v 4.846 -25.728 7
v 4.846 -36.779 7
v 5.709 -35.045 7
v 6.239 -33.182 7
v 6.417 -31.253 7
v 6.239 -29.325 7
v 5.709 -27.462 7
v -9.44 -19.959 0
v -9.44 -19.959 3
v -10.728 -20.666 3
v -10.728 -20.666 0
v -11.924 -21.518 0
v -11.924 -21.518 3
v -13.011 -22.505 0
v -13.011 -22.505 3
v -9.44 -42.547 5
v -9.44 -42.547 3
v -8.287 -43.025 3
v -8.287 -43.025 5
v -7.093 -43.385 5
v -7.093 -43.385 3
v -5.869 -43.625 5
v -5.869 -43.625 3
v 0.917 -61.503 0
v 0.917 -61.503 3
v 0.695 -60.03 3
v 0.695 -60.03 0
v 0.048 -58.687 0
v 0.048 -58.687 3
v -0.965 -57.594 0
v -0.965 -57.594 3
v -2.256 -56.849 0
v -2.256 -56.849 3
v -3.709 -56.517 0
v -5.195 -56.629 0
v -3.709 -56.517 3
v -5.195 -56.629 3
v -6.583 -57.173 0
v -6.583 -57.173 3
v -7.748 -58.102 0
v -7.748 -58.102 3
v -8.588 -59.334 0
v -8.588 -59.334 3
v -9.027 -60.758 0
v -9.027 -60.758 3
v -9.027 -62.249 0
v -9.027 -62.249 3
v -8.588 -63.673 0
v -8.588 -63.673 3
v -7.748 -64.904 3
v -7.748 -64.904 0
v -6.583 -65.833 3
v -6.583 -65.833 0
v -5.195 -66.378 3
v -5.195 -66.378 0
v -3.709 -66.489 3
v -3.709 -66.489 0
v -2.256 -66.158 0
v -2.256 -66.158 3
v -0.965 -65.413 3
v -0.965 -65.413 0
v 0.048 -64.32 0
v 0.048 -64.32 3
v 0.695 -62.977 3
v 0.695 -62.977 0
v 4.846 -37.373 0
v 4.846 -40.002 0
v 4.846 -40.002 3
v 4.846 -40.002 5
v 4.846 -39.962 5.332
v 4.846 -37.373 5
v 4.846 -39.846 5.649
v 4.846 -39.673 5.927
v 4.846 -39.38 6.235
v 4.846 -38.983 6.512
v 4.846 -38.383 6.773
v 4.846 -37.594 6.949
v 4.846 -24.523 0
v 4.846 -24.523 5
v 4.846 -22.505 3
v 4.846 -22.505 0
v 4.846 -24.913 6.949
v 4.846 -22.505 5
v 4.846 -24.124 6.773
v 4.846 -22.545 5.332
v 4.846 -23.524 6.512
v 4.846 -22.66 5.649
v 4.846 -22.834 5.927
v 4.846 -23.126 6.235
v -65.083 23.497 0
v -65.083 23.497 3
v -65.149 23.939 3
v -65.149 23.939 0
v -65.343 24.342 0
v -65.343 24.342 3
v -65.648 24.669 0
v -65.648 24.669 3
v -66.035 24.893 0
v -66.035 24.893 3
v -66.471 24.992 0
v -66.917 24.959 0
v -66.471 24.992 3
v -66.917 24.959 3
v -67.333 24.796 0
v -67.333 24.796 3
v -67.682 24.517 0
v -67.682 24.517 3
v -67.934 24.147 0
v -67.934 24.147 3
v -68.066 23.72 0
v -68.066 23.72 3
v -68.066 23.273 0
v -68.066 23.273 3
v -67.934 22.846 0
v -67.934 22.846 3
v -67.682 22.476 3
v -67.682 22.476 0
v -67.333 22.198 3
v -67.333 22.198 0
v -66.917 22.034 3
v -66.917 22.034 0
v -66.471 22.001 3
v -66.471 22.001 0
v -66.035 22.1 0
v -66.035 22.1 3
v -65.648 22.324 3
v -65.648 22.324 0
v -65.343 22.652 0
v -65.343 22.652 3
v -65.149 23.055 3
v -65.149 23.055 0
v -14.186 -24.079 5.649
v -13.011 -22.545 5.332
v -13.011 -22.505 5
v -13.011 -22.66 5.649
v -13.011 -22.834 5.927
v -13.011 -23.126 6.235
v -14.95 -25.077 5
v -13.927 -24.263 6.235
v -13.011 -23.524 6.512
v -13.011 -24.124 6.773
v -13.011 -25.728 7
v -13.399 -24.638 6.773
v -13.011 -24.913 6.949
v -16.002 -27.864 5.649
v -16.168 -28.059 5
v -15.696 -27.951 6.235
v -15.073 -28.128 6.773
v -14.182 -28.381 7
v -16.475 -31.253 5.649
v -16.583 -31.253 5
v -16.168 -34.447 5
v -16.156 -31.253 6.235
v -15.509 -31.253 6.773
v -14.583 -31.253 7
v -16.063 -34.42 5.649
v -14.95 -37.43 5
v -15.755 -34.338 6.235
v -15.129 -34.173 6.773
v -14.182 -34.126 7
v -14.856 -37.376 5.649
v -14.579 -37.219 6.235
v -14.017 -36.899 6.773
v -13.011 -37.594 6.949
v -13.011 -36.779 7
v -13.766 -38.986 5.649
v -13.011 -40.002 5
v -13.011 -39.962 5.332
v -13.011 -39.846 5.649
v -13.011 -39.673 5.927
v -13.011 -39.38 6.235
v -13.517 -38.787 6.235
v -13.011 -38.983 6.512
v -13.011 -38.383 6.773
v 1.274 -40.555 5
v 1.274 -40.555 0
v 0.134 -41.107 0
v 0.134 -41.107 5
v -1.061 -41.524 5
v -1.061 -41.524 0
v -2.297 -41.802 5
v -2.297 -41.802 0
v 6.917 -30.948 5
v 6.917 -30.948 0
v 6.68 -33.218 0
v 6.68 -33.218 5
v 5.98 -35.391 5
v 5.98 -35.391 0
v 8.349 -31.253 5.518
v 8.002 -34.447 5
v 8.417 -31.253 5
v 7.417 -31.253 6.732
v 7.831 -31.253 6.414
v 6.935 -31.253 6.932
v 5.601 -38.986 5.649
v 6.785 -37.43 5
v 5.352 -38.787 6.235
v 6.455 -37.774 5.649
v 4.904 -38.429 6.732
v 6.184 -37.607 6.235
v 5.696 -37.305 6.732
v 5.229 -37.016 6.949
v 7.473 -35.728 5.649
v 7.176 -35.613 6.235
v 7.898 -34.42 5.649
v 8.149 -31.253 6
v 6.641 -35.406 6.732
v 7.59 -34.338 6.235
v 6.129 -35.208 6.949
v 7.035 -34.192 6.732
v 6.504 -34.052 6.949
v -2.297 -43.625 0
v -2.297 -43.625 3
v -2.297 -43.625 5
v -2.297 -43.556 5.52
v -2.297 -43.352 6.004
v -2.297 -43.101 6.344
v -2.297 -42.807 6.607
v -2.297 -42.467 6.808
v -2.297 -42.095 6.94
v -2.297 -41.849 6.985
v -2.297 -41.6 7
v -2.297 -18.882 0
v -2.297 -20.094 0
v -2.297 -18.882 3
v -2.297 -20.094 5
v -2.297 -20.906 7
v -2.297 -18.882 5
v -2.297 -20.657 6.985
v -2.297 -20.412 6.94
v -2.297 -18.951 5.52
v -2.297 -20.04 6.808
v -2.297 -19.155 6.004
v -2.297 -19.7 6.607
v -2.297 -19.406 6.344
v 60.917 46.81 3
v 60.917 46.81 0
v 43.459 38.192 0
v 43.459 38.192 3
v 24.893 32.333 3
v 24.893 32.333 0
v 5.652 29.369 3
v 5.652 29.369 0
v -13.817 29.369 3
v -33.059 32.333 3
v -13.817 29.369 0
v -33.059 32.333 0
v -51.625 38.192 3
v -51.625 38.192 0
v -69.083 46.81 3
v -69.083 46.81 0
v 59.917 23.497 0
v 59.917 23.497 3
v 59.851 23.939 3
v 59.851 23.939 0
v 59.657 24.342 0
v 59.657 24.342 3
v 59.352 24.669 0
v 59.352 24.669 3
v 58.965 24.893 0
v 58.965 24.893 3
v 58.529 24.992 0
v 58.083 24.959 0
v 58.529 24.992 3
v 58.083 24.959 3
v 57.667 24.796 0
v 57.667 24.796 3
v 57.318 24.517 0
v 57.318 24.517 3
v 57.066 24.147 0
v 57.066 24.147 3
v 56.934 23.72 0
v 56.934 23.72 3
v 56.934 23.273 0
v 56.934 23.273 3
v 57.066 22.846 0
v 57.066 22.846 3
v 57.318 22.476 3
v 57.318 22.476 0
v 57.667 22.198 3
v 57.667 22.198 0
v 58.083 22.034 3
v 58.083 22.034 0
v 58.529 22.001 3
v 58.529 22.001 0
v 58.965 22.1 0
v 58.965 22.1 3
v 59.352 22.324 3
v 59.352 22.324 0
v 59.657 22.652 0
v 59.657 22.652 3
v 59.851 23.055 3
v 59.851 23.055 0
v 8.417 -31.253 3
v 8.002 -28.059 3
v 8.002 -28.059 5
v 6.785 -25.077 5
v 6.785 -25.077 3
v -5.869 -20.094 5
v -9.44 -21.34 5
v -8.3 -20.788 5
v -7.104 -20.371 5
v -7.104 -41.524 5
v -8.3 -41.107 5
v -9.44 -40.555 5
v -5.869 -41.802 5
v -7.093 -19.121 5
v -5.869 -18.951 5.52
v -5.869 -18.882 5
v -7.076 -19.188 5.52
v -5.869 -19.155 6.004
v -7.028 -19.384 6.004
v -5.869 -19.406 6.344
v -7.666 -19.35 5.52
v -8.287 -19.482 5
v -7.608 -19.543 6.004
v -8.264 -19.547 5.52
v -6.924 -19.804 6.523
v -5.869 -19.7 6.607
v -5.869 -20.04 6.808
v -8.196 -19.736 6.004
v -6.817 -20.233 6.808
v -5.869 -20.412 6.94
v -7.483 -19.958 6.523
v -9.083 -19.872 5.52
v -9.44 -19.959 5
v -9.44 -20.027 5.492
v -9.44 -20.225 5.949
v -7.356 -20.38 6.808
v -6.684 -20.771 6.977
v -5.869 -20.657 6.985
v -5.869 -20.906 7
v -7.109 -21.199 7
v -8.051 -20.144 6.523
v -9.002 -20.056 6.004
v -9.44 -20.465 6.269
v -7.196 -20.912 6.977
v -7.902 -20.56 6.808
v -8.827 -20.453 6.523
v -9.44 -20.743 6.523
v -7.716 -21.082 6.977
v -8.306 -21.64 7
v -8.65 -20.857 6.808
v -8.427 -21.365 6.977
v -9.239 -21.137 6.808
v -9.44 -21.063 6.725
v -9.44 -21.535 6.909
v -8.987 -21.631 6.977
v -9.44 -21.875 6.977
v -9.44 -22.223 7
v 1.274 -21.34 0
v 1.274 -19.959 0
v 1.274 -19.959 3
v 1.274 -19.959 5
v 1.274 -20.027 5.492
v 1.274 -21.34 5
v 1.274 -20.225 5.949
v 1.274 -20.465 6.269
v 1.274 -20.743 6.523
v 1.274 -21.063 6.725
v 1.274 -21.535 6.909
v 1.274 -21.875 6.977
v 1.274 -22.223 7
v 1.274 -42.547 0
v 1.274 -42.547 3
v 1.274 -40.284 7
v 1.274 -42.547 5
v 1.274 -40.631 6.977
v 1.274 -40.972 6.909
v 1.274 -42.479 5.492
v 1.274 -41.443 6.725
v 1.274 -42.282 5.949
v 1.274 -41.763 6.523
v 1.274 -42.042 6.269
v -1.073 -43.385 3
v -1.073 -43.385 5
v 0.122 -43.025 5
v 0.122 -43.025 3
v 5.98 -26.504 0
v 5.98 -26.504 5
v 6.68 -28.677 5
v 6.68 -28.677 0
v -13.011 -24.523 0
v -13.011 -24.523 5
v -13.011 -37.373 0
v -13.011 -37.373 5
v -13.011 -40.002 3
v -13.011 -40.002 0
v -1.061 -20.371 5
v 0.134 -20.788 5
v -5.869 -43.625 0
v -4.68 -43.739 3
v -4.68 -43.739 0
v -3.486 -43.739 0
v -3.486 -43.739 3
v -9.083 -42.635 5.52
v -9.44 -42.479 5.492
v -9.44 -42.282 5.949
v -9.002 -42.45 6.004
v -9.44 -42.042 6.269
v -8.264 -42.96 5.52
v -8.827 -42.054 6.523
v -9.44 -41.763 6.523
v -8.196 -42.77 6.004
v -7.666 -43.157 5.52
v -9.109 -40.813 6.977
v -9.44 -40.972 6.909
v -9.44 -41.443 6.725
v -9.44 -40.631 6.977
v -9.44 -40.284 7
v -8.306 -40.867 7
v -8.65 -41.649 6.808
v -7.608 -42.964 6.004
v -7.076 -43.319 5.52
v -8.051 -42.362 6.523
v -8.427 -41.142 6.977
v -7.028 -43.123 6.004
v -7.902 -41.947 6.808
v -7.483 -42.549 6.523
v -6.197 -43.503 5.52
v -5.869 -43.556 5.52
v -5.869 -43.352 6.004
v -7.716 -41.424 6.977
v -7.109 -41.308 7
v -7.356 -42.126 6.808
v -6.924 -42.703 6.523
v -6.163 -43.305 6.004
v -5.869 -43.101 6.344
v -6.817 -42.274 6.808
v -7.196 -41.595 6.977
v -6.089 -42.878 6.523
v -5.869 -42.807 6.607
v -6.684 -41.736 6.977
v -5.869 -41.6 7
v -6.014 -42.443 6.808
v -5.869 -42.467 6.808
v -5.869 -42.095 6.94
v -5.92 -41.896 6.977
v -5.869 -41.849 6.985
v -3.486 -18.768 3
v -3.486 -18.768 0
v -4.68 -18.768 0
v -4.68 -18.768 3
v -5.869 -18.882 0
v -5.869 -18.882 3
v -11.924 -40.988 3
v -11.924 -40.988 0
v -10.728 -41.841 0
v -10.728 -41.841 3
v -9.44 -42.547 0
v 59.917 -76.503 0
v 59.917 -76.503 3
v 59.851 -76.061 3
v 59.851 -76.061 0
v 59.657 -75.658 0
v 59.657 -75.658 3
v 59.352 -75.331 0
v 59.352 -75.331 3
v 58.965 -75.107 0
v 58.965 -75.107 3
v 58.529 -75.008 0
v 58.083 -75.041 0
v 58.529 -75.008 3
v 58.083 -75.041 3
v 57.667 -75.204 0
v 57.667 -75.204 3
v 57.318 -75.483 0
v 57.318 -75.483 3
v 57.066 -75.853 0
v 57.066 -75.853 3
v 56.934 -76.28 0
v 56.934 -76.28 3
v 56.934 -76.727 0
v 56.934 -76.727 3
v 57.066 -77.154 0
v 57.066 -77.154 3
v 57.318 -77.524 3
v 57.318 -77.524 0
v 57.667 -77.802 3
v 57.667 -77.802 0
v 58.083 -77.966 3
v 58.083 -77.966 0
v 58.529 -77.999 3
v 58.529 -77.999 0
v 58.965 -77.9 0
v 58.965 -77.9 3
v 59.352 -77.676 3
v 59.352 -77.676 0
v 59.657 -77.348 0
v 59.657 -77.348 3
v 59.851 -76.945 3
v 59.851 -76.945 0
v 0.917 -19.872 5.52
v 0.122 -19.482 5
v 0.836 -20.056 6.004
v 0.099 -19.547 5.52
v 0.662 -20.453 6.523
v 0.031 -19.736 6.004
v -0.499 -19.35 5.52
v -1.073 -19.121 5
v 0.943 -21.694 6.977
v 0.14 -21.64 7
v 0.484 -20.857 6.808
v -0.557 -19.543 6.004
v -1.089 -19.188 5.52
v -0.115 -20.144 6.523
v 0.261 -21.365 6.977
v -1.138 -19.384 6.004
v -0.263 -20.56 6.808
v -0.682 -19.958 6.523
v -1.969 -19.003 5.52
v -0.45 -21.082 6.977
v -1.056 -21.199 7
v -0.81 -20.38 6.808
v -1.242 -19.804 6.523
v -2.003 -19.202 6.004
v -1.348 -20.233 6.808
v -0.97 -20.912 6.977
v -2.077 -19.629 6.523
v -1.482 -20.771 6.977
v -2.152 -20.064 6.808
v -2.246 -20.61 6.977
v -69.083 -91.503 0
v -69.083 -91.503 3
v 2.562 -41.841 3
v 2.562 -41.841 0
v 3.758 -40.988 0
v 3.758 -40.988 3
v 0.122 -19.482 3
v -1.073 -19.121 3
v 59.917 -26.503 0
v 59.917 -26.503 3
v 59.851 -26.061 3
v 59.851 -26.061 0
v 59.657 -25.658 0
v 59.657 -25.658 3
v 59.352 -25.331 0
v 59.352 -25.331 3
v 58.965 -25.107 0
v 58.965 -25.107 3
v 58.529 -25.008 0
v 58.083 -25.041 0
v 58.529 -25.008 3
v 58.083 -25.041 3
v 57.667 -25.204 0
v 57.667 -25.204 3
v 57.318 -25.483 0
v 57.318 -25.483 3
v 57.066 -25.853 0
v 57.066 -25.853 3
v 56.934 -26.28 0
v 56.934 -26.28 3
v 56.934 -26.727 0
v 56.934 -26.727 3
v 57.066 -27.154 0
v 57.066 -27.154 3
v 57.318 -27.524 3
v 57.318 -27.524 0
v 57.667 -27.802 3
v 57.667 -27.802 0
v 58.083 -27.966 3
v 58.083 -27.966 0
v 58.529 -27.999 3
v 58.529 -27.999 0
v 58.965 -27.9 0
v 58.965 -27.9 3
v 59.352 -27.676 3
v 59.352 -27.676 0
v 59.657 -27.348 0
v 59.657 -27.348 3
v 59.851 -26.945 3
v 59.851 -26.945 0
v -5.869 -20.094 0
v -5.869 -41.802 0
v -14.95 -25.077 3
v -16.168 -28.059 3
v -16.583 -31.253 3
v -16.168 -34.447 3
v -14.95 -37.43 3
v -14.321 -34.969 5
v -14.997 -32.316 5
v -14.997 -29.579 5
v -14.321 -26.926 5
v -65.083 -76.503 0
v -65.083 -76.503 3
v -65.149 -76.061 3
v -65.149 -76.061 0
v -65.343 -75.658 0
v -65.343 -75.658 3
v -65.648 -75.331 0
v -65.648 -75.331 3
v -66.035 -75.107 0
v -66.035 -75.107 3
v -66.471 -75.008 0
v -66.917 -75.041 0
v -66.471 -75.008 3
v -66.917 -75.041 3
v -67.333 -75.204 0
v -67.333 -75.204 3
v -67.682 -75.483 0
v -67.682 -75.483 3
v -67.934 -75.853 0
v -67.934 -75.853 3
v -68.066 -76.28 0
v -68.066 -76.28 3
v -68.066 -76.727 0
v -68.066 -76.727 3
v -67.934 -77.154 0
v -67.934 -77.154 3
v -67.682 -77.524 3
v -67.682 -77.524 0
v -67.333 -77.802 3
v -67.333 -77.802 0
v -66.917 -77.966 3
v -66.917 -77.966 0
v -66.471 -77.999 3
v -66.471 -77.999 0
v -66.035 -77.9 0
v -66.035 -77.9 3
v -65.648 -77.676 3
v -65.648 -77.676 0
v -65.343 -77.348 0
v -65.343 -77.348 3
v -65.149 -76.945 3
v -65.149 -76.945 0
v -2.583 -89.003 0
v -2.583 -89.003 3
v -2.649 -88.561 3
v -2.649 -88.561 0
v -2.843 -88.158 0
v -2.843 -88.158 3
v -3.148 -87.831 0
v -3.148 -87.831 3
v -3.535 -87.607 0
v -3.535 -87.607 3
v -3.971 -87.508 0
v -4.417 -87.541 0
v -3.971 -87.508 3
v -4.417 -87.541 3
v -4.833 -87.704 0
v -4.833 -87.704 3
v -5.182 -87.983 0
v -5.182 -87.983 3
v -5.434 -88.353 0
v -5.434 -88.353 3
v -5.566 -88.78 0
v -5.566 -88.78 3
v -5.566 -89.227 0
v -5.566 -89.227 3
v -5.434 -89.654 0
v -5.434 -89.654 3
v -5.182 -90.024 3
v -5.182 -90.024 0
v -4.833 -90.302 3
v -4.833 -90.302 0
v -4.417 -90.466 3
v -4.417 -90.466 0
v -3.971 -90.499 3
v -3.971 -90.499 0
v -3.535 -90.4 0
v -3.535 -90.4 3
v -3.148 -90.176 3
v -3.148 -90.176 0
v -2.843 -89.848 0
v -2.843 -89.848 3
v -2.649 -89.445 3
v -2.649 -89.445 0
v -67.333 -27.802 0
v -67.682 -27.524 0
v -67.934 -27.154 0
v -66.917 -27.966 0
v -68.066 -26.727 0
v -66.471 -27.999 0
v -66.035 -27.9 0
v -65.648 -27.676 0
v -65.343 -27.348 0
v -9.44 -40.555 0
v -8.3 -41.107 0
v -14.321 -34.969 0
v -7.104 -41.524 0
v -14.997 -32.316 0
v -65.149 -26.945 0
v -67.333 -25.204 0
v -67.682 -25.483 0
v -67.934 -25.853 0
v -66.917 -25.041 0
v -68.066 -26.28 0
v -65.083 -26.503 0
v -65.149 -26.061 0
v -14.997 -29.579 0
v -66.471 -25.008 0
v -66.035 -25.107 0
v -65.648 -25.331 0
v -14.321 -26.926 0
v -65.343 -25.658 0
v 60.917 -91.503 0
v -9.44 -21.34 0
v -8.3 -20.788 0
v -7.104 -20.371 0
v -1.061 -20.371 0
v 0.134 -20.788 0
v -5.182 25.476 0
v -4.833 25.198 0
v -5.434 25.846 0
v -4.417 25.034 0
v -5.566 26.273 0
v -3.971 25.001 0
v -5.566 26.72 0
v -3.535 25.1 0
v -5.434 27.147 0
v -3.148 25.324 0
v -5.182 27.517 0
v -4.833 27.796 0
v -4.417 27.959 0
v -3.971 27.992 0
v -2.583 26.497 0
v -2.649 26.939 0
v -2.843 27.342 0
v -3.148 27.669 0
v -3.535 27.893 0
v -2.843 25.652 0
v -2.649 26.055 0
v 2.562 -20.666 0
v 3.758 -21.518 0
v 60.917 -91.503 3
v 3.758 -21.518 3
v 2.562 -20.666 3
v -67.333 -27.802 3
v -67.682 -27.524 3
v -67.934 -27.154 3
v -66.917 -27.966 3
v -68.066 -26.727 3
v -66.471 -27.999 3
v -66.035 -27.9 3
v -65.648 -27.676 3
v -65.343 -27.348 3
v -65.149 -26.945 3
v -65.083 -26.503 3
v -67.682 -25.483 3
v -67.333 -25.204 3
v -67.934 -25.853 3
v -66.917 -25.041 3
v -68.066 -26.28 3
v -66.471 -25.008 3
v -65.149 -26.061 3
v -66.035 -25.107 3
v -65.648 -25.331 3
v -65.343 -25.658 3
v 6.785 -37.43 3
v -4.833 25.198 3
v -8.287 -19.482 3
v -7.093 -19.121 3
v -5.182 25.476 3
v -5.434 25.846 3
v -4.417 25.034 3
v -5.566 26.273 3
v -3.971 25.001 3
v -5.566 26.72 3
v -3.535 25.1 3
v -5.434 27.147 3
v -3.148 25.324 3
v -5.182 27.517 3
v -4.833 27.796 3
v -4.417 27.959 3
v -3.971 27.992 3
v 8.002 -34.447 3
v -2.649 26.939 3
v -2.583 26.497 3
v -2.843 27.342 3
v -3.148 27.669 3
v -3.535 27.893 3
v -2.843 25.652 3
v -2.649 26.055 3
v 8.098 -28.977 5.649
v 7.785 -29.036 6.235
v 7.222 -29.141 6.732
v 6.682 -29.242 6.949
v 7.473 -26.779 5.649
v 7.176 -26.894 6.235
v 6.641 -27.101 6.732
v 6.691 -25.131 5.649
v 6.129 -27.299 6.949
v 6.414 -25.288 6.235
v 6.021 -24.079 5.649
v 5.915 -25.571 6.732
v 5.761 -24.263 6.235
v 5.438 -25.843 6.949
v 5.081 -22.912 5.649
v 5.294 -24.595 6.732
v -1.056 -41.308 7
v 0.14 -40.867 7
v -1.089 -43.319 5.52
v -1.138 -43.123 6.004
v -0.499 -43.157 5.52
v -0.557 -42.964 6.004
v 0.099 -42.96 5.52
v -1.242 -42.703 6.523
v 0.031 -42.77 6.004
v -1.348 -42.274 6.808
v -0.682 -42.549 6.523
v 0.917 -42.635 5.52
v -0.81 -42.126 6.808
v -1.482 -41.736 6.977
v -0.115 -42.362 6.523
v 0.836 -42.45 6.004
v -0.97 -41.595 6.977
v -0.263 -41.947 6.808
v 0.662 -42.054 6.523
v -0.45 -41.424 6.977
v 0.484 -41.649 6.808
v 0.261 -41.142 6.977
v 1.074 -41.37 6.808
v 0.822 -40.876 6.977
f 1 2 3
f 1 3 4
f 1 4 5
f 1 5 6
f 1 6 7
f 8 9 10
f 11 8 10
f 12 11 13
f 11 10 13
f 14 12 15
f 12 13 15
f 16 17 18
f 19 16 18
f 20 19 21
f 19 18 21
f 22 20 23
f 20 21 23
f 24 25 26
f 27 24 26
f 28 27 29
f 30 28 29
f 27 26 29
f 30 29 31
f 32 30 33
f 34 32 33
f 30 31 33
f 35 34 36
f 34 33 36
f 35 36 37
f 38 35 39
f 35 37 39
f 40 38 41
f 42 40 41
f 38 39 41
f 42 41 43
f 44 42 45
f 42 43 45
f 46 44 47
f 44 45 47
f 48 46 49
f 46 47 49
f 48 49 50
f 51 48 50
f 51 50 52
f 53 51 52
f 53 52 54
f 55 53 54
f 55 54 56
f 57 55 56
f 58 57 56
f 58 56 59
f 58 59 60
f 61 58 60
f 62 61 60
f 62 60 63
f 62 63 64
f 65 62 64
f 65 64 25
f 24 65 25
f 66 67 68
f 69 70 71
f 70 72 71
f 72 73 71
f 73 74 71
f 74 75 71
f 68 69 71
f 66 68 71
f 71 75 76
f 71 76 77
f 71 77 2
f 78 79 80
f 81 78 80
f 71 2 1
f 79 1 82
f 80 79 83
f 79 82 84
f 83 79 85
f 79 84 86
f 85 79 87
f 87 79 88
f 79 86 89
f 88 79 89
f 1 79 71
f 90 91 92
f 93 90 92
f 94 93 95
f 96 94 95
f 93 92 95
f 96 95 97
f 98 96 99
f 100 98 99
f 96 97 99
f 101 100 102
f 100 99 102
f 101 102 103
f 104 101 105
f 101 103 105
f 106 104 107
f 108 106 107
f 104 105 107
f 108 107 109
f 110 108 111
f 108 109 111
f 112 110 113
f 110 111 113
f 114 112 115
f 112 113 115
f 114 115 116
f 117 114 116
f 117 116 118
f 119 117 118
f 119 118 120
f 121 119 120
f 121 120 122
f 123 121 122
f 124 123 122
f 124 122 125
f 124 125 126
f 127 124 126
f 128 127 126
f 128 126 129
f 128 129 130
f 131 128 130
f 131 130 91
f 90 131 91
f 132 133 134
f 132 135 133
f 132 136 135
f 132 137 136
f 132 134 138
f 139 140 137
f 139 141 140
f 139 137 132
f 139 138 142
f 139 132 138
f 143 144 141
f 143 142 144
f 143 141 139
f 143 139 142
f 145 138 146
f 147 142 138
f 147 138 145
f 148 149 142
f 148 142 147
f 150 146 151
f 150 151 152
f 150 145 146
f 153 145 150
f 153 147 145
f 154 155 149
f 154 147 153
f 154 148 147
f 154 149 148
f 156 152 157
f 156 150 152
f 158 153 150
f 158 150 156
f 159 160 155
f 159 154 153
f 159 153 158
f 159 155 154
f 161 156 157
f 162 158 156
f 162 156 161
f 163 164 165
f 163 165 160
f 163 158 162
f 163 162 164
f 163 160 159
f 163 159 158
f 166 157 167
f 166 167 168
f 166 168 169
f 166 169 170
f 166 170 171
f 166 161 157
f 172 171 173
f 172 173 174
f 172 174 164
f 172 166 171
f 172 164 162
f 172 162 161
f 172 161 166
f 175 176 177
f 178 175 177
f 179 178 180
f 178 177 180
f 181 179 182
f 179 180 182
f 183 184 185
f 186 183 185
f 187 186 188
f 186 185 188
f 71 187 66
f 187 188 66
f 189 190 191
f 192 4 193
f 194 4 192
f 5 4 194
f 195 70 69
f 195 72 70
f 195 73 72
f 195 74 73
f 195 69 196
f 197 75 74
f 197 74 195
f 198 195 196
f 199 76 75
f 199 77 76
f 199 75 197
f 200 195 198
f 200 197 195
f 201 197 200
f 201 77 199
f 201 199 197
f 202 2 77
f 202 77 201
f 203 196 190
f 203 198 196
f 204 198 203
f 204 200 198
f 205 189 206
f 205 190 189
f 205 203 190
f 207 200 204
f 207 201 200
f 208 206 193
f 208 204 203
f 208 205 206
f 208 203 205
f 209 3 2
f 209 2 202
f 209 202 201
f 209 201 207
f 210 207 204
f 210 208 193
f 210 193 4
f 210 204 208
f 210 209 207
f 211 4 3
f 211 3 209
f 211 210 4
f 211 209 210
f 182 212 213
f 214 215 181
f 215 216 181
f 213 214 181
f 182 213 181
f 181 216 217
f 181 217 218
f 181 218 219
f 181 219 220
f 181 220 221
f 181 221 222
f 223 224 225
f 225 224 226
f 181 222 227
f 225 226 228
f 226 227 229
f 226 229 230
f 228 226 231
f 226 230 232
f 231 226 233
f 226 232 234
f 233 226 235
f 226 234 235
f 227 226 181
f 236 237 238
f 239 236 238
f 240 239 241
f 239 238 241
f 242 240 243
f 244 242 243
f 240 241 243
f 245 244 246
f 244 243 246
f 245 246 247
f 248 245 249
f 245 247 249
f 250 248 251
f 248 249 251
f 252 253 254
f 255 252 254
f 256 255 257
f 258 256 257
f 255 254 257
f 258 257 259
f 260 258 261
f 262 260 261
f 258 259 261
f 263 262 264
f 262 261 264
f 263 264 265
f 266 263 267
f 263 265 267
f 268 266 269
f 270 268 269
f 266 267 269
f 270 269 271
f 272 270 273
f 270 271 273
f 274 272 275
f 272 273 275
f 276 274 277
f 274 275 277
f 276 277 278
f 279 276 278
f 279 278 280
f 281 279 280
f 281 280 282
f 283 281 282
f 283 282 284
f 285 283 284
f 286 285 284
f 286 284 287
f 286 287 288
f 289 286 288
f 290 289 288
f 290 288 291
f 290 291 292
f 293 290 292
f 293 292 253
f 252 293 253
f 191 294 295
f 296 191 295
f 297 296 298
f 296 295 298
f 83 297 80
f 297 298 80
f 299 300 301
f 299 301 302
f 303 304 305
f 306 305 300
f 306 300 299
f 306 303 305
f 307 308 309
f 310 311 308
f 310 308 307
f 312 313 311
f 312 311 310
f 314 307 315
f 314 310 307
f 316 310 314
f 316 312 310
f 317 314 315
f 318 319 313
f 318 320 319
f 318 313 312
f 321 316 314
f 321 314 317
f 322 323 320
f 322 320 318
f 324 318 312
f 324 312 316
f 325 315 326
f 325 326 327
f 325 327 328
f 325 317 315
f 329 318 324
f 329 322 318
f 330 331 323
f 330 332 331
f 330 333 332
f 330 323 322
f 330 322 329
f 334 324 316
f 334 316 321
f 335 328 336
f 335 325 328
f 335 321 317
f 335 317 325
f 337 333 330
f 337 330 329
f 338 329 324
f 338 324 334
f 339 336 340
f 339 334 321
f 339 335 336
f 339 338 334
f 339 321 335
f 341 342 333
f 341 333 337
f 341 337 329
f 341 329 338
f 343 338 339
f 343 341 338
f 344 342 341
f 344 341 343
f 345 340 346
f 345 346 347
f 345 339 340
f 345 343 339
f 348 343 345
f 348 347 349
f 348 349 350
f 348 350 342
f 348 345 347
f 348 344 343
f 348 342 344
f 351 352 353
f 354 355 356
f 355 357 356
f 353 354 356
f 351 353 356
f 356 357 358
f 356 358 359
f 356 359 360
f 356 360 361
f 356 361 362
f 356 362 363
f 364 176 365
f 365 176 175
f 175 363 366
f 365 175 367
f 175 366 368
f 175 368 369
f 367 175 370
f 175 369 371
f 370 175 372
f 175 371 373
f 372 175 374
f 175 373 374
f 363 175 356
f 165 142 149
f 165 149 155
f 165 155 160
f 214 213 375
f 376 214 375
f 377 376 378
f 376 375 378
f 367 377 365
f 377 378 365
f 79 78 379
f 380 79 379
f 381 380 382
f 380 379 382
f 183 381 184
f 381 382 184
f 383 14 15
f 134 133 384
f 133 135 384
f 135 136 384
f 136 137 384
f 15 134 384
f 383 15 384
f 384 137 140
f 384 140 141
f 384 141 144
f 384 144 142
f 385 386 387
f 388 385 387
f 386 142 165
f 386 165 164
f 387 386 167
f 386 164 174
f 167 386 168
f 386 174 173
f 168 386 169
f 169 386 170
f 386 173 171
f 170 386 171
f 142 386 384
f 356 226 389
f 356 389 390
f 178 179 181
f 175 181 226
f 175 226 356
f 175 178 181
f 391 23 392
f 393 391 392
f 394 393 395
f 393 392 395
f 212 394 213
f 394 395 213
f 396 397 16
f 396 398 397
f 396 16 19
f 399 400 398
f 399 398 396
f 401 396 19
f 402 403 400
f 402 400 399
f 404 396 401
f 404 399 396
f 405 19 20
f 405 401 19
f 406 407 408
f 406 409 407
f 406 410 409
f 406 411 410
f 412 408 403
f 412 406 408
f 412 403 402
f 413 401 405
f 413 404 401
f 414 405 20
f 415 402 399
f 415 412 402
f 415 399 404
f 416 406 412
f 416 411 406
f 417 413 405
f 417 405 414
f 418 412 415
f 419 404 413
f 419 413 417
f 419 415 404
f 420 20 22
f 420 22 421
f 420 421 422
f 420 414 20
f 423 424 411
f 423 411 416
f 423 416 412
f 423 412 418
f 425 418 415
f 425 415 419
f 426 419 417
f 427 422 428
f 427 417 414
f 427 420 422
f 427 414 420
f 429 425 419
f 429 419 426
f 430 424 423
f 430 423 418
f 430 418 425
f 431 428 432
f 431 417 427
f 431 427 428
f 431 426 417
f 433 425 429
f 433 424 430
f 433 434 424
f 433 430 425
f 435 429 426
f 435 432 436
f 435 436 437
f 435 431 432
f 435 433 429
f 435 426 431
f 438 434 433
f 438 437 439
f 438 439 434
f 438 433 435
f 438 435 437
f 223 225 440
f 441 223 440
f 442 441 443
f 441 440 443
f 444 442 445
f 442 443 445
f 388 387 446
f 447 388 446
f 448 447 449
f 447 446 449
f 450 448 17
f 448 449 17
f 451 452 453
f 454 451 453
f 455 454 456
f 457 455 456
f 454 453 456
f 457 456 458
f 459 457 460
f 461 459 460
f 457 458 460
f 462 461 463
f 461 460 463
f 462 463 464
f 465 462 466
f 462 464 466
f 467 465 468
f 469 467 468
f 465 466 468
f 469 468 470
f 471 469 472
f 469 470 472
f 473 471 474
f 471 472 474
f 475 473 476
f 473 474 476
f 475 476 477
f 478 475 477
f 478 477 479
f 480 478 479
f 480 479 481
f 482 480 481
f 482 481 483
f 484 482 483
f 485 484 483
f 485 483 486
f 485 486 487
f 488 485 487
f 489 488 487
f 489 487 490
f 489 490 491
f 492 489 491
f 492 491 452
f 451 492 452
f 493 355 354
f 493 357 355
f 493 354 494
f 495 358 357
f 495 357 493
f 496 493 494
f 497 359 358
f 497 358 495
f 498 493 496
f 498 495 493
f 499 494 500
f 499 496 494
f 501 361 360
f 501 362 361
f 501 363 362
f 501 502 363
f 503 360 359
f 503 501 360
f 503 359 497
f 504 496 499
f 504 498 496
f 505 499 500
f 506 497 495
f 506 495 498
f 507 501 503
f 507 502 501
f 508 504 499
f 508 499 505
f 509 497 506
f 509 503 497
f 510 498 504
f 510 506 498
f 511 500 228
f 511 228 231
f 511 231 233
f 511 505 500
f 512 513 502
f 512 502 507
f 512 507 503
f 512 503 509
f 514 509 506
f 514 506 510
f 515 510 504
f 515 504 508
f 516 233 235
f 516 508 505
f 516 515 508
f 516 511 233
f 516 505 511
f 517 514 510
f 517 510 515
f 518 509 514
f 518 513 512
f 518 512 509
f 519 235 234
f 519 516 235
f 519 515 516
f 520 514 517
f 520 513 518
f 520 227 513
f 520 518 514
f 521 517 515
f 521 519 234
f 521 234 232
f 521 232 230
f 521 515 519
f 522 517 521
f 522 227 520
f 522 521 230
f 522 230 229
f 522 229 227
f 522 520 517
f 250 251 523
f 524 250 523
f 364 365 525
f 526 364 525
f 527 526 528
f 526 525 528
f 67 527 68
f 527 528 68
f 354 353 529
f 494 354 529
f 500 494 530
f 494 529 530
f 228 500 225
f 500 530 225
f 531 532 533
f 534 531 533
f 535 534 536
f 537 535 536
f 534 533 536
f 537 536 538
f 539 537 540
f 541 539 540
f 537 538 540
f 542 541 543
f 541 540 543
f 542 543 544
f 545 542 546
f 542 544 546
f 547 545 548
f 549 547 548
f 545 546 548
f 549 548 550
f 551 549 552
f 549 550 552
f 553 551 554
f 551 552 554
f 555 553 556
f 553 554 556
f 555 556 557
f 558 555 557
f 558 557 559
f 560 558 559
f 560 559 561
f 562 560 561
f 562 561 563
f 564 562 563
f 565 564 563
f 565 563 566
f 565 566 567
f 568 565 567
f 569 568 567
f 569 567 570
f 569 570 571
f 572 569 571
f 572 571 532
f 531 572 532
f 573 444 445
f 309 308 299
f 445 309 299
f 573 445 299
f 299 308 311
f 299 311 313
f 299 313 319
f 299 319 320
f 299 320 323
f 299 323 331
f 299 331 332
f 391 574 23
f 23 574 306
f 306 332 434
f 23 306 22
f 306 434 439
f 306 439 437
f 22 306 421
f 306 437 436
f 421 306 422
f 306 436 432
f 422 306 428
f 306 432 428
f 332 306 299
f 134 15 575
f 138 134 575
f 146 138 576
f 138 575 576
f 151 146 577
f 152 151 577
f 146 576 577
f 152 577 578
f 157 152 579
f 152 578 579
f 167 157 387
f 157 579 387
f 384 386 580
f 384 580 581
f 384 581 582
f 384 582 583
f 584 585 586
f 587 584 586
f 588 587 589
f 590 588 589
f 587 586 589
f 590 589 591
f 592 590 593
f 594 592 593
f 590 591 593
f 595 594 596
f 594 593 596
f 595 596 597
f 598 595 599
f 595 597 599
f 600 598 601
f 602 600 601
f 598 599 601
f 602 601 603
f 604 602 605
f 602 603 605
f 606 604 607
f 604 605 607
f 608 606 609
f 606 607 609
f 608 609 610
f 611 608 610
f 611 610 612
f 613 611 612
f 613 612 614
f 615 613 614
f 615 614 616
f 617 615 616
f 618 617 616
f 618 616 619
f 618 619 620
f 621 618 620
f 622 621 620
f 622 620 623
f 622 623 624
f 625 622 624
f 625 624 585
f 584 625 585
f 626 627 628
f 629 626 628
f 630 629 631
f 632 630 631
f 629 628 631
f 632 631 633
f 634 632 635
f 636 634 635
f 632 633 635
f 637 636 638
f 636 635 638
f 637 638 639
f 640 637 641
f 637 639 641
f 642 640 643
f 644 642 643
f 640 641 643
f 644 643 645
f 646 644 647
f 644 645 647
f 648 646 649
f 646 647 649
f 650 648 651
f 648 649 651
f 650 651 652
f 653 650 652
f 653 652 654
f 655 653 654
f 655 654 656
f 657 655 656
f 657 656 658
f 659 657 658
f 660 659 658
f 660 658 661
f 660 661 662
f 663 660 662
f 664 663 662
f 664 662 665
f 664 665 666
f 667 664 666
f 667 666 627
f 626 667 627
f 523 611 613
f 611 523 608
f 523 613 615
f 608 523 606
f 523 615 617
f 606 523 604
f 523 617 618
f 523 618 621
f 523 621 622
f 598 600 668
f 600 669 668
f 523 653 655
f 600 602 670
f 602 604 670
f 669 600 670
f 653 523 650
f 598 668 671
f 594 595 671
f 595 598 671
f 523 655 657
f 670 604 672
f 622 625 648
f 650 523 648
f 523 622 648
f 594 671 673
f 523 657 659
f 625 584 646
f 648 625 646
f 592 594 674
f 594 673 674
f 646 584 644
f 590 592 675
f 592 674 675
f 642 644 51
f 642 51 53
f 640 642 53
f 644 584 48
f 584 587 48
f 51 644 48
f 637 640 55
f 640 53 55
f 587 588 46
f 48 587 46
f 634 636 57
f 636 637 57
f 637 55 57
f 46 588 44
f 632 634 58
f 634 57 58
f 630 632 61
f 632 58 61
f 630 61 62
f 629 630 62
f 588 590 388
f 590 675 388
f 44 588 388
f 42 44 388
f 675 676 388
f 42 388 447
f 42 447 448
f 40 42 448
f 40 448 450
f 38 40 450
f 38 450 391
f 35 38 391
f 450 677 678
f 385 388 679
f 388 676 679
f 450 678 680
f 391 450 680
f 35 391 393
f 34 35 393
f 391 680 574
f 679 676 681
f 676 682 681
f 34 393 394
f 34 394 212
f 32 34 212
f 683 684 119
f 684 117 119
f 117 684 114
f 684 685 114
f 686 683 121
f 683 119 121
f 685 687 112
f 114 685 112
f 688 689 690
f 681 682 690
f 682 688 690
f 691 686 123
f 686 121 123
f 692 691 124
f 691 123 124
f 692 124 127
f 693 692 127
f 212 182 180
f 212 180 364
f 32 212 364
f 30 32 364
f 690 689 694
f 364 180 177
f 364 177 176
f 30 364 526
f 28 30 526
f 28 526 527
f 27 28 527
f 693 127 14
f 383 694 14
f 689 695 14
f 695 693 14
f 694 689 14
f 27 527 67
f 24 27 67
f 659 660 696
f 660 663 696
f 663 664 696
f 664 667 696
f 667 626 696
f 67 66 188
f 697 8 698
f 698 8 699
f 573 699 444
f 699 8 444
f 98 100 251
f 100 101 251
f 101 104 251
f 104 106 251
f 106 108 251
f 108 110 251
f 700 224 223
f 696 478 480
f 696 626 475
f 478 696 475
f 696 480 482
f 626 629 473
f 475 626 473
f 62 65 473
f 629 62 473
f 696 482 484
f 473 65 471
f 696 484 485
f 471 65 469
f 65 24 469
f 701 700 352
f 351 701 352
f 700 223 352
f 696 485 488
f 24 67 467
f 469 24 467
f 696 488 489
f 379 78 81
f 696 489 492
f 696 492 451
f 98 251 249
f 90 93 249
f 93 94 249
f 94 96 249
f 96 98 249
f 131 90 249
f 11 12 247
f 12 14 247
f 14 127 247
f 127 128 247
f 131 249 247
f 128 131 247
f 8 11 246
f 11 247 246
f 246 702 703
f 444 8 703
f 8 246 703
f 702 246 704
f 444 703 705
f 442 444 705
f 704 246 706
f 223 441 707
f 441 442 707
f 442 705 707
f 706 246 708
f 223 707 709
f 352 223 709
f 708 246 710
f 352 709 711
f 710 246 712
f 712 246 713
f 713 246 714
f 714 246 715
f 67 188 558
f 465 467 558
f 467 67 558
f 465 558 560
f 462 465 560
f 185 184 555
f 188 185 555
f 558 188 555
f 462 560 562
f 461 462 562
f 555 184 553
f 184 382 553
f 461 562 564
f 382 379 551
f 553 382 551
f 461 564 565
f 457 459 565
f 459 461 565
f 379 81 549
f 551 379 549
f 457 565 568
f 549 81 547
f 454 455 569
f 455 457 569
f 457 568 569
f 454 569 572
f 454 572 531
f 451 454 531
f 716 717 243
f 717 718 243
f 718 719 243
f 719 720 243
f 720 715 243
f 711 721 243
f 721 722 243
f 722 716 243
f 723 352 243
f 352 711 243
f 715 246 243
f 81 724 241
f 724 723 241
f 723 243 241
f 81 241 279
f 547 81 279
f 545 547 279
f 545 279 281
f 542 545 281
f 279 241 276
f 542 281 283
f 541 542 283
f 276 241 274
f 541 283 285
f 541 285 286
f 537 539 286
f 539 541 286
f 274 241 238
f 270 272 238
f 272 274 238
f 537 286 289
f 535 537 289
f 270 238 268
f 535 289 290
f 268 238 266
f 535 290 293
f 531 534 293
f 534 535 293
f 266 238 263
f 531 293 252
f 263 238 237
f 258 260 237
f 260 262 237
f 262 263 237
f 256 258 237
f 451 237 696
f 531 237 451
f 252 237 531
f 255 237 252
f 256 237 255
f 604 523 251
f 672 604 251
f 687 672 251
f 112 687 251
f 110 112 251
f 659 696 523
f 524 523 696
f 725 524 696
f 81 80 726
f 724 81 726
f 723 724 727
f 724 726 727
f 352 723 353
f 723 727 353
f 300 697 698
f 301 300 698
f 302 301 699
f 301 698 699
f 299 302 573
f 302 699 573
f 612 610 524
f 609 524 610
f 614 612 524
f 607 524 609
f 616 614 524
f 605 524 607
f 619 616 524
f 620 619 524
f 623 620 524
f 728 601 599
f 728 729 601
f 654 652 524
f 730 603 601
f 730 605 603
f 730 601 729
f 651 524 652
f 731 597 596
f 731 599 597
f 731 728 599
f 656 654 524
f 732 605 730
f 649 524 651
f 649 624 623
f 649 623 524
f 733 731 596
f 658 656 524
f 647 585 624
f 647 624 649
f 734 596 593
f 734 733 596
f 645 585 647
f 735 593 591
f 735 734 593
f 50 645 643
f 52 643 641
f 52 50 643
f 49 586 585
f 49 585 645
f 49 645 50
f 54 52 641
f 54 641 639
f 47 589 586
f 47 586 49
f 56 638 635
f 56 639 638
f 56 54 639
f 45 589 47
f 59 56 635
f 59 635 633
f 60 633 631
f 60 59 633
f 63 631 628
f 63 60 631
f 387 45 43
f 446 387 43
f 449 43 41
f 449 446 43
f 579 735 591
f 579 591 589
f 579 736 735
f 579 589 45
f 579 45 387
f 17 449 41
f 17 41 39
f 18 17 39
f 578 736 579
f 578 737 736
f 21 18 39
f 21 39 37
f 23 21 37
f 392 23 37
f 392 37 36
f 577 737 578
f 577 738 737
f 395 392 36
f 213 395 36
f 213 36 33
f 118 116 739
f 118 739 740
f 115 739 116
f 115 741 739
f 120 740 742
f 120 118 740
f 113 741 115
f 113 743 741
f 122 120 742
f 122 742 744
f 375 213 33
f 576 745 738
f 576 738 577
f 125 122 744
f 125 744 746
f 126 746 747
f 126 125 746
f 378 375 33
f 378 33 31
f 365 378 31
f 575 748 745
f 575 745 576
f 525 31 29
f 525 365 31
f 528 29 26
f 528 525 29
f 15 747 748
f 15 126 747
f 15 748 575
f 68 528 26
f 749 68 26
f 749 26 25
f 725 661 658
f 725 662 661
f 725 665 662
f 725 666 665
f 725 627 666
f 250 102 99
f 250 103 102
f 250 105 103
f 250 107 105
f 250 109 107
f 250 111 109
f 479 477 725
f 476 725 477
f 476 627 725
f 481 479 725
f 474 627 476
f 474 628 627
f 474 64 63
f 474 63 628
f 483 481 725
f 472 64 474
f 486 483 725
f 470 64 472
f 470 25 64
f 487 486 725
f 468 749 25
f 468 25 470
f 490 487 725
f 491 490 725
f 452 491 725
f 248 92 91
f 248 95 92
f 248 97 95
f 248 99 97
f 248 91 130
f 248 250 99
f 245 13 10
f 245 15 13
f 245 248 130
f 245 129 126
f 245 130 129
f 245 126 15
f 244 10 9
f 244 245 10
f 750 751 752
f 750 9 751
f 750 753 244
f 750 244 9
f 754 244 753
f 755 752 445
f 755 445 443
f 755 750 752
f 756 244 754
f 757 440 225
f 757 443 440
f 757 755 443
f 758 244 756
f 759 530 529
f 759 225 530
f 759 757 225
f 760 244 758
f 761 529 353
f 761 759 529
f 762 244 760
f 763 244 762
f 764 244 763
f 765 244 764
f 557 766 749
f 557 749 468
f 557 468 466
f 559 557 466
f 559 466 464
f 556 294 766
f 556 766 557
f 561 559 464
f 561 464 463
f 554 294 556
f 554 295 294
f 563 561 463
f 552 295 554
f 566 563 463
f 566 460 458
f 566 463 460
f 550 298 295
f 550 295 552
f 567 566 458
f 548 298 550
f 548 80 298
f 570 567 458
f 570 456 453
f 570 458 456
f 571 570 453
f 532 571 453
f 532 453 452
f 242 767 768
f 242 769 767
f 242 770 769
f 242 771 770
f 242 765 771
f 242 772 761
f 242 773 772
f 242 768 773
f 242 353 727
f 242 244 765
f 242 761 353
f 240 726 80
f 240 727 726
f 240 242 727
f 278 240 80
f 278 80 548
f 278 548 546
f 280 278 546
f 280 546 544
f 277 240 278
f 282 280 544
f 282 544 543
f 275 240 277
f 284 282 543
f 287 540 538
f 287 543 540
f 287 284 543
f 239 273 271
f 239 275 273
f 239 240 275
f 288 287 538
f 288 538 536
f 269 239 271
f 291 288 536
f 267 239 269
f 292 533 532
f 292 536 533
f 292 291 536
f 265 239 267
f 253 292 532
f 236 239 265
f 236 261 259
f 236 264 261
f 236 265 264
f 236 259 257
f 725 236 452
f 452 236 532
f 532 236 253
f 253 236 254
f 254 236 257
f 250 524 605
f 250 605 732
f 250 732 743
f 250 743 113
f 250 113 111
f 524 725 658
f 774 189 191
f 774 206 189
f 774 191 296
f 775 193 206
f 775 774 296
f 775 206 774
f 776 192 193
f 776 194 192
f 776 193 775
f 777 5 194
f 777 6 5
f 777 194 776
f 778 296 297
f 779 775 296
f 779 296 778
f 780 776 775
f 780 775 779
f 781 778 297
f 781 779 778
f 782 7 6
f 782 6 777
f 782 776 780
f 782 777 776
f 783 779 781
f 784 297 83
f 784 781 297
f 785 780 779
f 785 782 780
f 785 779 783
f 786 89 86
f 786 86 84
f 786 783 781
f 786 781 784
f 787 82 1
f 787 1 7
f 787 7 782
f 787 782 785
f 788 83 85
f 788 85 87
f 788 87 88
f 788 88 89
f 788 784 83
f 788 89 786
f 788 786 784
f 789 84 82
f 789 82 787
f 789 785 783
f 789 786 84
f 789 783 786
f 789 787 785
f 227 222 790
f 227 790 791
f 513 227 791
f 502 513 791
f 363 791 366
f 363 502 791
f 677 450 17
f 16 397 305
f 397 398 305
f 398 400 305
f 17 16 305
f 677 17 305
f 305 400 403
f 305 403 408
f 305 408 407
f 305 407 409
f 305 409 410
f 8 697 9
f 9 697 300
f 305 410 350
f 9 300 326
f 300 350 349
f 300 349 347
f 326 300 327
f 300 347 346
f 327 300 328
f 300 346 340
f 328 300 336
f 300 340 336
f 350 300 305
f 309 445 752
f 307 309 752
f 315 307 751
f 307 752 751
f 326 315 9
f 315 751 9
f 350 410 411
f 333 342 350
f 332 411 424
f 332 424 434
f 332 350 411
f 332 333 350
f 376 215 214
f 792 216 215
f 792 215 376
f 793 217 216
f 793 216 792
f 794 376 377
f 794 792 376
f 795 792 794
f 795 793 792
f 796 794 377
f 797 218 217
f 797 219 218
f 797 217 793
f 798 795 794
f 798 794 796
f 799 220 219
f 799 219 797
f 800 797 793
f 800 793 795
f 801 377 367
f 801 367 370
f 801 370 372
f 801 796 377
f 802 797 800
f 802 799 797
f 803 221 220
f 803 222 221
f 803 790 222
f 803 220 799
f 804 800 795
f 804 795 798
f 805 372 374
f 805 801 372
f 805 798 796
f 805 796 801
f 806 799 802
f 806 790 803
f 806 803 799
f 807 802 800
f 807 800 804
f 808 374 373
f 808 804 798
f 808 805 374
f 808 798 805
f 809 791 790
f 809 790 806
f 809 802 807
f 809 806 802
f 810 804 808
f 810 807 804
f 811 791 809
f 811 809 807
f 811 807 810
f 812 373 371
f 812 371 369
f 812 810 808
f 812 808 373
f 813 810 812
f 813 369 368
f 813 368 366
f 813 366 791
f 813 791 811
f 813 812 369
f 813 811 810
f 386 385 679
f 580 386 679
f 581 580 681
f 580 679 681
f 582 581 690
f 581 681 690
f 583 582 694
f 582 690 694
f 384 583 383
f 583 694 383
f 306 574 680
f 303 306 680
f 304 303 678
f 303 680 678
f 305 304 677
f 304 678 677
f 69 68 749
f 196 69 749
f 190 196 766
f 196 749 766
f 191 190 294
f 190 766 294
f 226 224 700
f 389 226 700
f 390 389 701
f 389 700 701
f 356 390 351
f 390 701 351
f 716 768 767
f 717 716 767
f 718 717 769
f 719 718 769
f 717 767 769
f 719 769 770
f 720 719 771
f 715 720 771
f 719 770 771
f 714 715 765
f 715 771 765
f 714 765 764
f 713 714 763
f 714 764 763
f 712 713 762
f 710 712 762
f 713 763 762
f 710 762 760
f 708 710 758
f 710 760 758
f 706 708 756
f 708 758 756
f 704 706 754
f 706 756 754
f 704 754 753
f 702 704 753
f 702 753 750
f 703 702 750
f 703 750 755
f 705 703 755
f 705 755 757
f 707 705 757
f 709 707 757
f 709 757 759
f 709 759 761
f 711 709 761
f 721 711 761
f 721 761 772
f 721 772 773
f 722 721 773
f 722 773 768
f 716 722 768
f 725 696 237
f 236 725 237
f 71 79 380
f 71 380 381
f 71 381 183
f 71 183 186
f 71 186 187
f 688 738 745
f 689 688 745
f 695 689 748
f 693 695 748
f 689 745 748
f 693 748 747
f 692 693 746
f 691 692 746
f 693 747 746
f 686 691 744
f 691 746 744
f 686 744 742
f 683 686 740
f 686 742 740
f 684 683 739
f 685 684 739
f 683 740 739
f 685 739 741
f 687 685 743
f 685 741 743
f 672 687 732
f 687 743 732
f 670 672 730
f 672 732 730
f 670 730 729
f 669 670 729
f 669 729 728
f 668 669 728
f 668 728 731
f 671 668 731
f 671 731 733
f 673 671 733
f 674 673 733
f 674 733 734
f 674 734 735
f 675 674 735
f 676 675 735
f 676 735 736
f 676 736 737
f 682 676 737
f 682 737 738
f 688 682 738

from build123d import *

# Parameters (mm, degrees)
F1_DEPTH  = 3
F2_R      = 1.5
F3_DEPTH  = 25
F5_DEPTH  = 4
F6_DEPTH  = 25
F7_R      = 2
F9_DEPTH  = 5
F10_R     = 5
F11_DEPTH = 25


# Not quite as in the source:
# - ends of sketch curves that miss each other by under 0.0002 mm in the source are joined


with BuildPart() as f1:
    # F0 (on Top) → F1 (new body)
    with BuildSketch(Plane.XY):
        with BuildLine():
            ThreePointArc((49.2280806434, 33.0130470502), (48.1713658013, 32.5621821126), (47.1108383201, 32.1203598507))
            Line((47.1108383201, 32.1203598507), (-4.1065374511, -22.3721440377))
            Line((-4.1065374511, -22.3721440377), (54.4172076095, -84.5927516487))
            Line((54.4172076095, -84.5927516487), (54.4172076095, 33.0130470502))
            Line((54.4172076095, 33.0130470502), (49.2280806434, 33.0130470502))
        make_face()
        Polygon((-4.1065374511, -22.3721440377), (-62.5827923905, -84.587700803), (-62.5827923905, -85.003347494), (54.4172076095, -85.003347494), (54.4172076095, -84.5927516487), align=None)
        with BuildLine():
            Line((-62.5827923905, 33.0130470502), (-62.5827923905, -84.587700803))
            Line((-62.5827923905, -84.587700803), (-4.1065374511, -22.3721440377))
            Line((-4.1065374511, -22.3721440377), (-55.4151337668, 32.1775440438))
            ThreePointArc((-55.4151337668, 32.1775440438), (-56.406067296, 32.5913463114), (-57.3936654243, 33.0130470502))
            Line((-57.3936654243, 33.0130470502), (-62.5827923905, 33.0130470502))
        make_face()
        with BuildLine():
            Line((-4.1065374511, -22.3721440377), (47.1108383201, 32.1203598507))
            ThreePointArc((47.1108383201, 32.1203598507), (-4.1578101896, 21.9966734267), (-55.4151337668, 32.1775440438))
            Line((-55.4151337668, 32.1775440438), (-4.1065374511, -22.3721440377))
        make_face()
        with BuildLine():
            ThreePointArc((60.9172316623, 46.8096119171), (-4.082778411, 28.996652506), (-69.0827923905, 46.8095976636))
            Line((-69.0827923905, 46.8095976636), (-69.0827923905, -91.503347494))
            Line((-69.0827923905, -91.503347494), (-62.5827923905, -84.587700803))
            Line((-62.5827923905, -84.587700803), (-62.5827923905, 33.0130470502))
            Line((-62.5827923905, 33.0130470502), (-57.3936654243, 33.0130470502))
            ThreePointArc((-57.3936654243, 33.0130470502), (-56.406067296, 32.5913463114), (-55.4151337668, 32.1775440438))
            ThreePointArc((-55.4151337668, 32.1775440438), (-4.1578101896, 21.9966734267), (47.1108383201, 32.1203598507))
            Line((47.1108383201, 32.1203598507), (60.9172316623, 46.8096119171))
        make_face()
        with BuildLine():
            Line((60.9172076095, -91.503347494), (60.9172076095, 46.809652506))
            Line((60.9172076095, 46.809652506), (47.1108383201, 32.1203598507))
            ThreePointArc((47.1108383201, 32.1203598507), (48.1713658013, 32.5621821126), (49.2280806434, 33.0130470502))
            Line((49.2280806434, 33.0130470502), (54.4172076095, 33.0130470502))
            Line((54.4172076095, 33.0130470502), (54.4172076095, -84.5927516487))
            Line((54.4172076095, -84.5927516487), (60.9172076095, -91.503347494))
        make_face()
        Polygon((-62.5827923905, -84.587700803), (-69.0827923905, -91.503347494), (60.9172076095, -91.503347494), (54.4172076095, -84.5927516487), (54.4172076095, -85.003347494), (-62.5827923905, -85.003347494), align=None)
    extrude(amount=F1_DEPTH)

    # F2 (on face) → F3 (cut)
    with BuildSketch(Plane.XY.offset(3)):
        with Locations((58.4172076095, -76.503347494)):
            Circle(F2_R)
        with Locations((58.4172076095, -26.503347494)):
            Circle(F2_R)
        with Locations((58.4172076095, 23.496652506)):
            Circle(F2_R)
        with Locations((-4.0827923905, 26.496652506)):
            Circle(F2_R)
        with Locations((-66.5827923905, -76.503347494)):
            Circle(F2_R)
        with Locations((-4.0827923905, -89.003347494)):
            Circle(F2_R)
        with Locations((-66.5827923905, -26.503347494)):
            Circle(F2_R)
        with Locations((-66.5827923905, 23.496652506)):
            Circle(F2_R)
    extrude(amount=-F3_DEPTH, mode=Mode.SUBTRACT)

    # F4 (on face) → F5 (join)
    with BuildSketch(Plane.XY.offset(3)):
        with BuildLine():
            Line((-13.011363819, -40.0015251468), (-13.011363819, -22.5051698412))
            ThreePointArc((-13.011363819, -22.5051698412), (-16.5827923905, -31.253347494), (-13.011363819, -40.0015251468))
        make_face()
        with BuildLine():
            ThreePointArc((4.8457790381, -40.0015251468), (7.4899588567, -35.9779034066), (8.4172076095, -31.253347494))
            ThreePointArc((8.4172076095, -31.253347494), (7.4899588567, -26.5287915814), (4.8457790381, -22.5051698412))
            Line((4.8457790381, -22.5051698412), (4.8457790381, -40.0015251468))
        make_face()
        with BuildLine():
            Line((1.2743504667, -42.5471962803), (1.2743504667, -19.9594987077))
            ThreePointArc((1.2743504667, -19.9594987077), (-0.4709241544, -19.2865430816), (-2.2970781048, -18.8815560114))
            Line((-2.2970781048, -18.8815560114), (-2.2970781048, -43.6251389767))
            ThreePointArc((-2.2970781048, -43.6251389767), (-0.4709241544, -43.2201519064), (1.2743504667, -42.5471962803))
        make_face()
        with BuildLine():
            Line((-5.8685066762, -43.6251389767), (-5.8685066762, -18.8815560114))
            ThreePointArc((-5.8685066762, -18.8815560114), (-7.6946606266, -19.2865430816), (-9.4399352476, -19.9594987077))
            Line((-9.4399352476, -19.9594987077), (-9.4399352476, -42.5471962803))
            ThreePointArc((-9.4399352476, -42.5471962803), (-7.6946606266, -43.2201519064), (-5.8685066762, -43.6251389767))
        make_face()
    extrude(amount=F5_DEPTH)

    # F4 (on face) → F6 (cut)
    with BuildSketch(Plane.XY.offset(3)):
        with BuildLine():
            Line((-9.4399352476, -42.5471962803), (-9.4399352476, -19.9594987077))
            ThreePointArc((-9.4399352476, -19.9594987077), (-11.3381709845, -21.0744732215), (-13.011363819, -22.5051698412))
            Line((-13.011363819, -22.5051698412), (-13.011363819, -40.0015251468))
            ThreePointArc((-13.011363819, -40.0015251468), (-11.3381709845, -41.4322217666), (-9.4399352476, -42.5471962803))
        make_face()
        with BuildLine():
            Line((-2.2970781048, -43.6251389767), (-2.2970781048, -18.8815560114))
            ThreePointArc((-2.2970781048, -18.8815560114), (-4.0827923905, -18.753347494), (-5.8685066762, -18.8815560114))
            Line((-5.8685066762, -18.8815560114), (-5.8685066762, -43.6251389767))
            ThreePointArc((-5.8685066762, -43.6251389767), (-4.0827923905, -43.753347494), (-2.2970781048, -43.6251389767))
        make_face()
        with BuildLine():
            Line((4.8457790381, -40.0015251468), (4.8457790381, -22.5051698412))
            ThreePointArc((4.8457790381, -22.5051698412), (3.1725862036, -21.0744732215), (1.2743504667, -19.9594987077))
            Line((1.2743504667, -19.9594987077), (1.2743504667, -42.5471962803))
            ThreePointArc((1.2743504667, -42.5471962803), (3.1725862036, -41.4322217666), (4.8457790381, -40.0015251468))
        make_face()
    extrude(amount=-F6_DEPTH, mode=Mode.SUBTRACT)

    # F7
    f7_edges = [f1.edges().sort_by_distance(p)[0] for p in [
        (-7.694661, -19.286543, 7),
        (-16.582792, -31.253347, 7),
        (-0.470924, -19.286543, 7),
        (8.417208, -31.253347, 7),
        (-0.470924, -43.220152, 7),
        (-7.694661, -43.220152, 7),
    ]]
    fillet(f7_edges, radius=F7_R)

    # F8 (on face) → F9 (cut)
    with BuildSketch(Plane(origin=(0, 0, 0), x_dir=(1, 0, 0), z_dir=(0, 0, -1))):
        with BuildLine():
            ThreePointArc((4.8457790381, 24.5226173164), (6.3865506098, 27.5722856522), (6.9172076095, 30.9476163238))
            ThreePointArc((6.9172076095, 30.9476163238), (6.3865506098, 34.3229469955), (4.8457790381, 37.3726153312))
            Line((4.8457790381, 37.3726153312), (4.8457790381, 24.5226173164))
        make_face()
        with BuildLine():
            Line((1.2743504667, 21.3402743185), (1.2743504667, 40.5549583292))
            ThreePointArc((1.2743504667, 40.5549583292), (-0.4573688452, 41.3330052967), (-2.2970781048, 41.8017042399))
            Line((-2.2970781048, 41.8017042399), (-2.2970781048, 20.0935284078))
            ThreePointArc((-2.2970781048, 20.0935284078), (-0.4573688452, 20.562227351), (1.2743504667, 21.3402743185))
        make_face()
        with BuildLine():
            Line((-2.2970781048, 20.0935284078), (-2.2970781048, 41.8017042399))
            ThreePointArc((-2.2970781048, 41.8017042399), (-4.0827923905, 41.9476163238), (-5.8685066762, 41.8017042399))
            Line((-5.8685066762, 41.8017042399), (-5.8685066762, 20.0935284078))
            ThreePointArc((-5.8685066762, 20.0935284078), (-4.0827923905, 19.9476163238), (-2.2970781048, 20.0935284078))
        make_face()
        with BuildLine():
            Line((-5.8685066762, 20.0935284078), (-5.8685066762, 41.8017042399))
            ThreePointArc((-5.8685066762, 41.8017042399), (-7.7082159357, 41.3330052967), (-9.4399352476, 40.5549583292))
            Line((-9.4399352476, 40.5549583292), (-9.4399352476, 21.3402743185))
            ThreePointArc((-9.4399352476, 21.3402743185), (-7.7082159357, 20.562227351), (-5.8685066762, 20.0935284078))
        make_face()
        with BuildLine():
            Line((-9.4399352476, 21.3402743185), (-9.4399352476, 40.5549583292))
            ThreePointArc((-9.4399352476, 40.5549583292), (-11.4007316429, 39.1602751562), (-13.011363819, 37.3726153312))
            Line((-13.011363819, 37.3726153312), (-13.011363819, 24.5226173164))
            ThreePointArc((-13.011363819, 24.5226173164), (-11.4007316429, 22.7349574914), (-9.4399352476, 21.3402743185))
        make_face()
        with BuildLine():
            Line((-13.011363819, 24.5226173164), (-13.011363819, 37.3726153312))
            ThreePointArc((-13.011363819, 37.3726153312), (-15.0827923905, 30.9476163238), (-13.011363819, 24.5226173164))
        make_face()
    extrude(amount=-F9_DEPTH, mode=Mode.SUBTRACT)

    # F10 (on face) → F11 (cut)
    with BuildSketch(Plane.XY.offset(3)):
        with Locations((-4.0827923905, -61.503347494)):
            Circle(F10_R)
    extrude(amount=-F11_DEPTH, mode=Mode.SUBTRACT)


solid = f1.part
